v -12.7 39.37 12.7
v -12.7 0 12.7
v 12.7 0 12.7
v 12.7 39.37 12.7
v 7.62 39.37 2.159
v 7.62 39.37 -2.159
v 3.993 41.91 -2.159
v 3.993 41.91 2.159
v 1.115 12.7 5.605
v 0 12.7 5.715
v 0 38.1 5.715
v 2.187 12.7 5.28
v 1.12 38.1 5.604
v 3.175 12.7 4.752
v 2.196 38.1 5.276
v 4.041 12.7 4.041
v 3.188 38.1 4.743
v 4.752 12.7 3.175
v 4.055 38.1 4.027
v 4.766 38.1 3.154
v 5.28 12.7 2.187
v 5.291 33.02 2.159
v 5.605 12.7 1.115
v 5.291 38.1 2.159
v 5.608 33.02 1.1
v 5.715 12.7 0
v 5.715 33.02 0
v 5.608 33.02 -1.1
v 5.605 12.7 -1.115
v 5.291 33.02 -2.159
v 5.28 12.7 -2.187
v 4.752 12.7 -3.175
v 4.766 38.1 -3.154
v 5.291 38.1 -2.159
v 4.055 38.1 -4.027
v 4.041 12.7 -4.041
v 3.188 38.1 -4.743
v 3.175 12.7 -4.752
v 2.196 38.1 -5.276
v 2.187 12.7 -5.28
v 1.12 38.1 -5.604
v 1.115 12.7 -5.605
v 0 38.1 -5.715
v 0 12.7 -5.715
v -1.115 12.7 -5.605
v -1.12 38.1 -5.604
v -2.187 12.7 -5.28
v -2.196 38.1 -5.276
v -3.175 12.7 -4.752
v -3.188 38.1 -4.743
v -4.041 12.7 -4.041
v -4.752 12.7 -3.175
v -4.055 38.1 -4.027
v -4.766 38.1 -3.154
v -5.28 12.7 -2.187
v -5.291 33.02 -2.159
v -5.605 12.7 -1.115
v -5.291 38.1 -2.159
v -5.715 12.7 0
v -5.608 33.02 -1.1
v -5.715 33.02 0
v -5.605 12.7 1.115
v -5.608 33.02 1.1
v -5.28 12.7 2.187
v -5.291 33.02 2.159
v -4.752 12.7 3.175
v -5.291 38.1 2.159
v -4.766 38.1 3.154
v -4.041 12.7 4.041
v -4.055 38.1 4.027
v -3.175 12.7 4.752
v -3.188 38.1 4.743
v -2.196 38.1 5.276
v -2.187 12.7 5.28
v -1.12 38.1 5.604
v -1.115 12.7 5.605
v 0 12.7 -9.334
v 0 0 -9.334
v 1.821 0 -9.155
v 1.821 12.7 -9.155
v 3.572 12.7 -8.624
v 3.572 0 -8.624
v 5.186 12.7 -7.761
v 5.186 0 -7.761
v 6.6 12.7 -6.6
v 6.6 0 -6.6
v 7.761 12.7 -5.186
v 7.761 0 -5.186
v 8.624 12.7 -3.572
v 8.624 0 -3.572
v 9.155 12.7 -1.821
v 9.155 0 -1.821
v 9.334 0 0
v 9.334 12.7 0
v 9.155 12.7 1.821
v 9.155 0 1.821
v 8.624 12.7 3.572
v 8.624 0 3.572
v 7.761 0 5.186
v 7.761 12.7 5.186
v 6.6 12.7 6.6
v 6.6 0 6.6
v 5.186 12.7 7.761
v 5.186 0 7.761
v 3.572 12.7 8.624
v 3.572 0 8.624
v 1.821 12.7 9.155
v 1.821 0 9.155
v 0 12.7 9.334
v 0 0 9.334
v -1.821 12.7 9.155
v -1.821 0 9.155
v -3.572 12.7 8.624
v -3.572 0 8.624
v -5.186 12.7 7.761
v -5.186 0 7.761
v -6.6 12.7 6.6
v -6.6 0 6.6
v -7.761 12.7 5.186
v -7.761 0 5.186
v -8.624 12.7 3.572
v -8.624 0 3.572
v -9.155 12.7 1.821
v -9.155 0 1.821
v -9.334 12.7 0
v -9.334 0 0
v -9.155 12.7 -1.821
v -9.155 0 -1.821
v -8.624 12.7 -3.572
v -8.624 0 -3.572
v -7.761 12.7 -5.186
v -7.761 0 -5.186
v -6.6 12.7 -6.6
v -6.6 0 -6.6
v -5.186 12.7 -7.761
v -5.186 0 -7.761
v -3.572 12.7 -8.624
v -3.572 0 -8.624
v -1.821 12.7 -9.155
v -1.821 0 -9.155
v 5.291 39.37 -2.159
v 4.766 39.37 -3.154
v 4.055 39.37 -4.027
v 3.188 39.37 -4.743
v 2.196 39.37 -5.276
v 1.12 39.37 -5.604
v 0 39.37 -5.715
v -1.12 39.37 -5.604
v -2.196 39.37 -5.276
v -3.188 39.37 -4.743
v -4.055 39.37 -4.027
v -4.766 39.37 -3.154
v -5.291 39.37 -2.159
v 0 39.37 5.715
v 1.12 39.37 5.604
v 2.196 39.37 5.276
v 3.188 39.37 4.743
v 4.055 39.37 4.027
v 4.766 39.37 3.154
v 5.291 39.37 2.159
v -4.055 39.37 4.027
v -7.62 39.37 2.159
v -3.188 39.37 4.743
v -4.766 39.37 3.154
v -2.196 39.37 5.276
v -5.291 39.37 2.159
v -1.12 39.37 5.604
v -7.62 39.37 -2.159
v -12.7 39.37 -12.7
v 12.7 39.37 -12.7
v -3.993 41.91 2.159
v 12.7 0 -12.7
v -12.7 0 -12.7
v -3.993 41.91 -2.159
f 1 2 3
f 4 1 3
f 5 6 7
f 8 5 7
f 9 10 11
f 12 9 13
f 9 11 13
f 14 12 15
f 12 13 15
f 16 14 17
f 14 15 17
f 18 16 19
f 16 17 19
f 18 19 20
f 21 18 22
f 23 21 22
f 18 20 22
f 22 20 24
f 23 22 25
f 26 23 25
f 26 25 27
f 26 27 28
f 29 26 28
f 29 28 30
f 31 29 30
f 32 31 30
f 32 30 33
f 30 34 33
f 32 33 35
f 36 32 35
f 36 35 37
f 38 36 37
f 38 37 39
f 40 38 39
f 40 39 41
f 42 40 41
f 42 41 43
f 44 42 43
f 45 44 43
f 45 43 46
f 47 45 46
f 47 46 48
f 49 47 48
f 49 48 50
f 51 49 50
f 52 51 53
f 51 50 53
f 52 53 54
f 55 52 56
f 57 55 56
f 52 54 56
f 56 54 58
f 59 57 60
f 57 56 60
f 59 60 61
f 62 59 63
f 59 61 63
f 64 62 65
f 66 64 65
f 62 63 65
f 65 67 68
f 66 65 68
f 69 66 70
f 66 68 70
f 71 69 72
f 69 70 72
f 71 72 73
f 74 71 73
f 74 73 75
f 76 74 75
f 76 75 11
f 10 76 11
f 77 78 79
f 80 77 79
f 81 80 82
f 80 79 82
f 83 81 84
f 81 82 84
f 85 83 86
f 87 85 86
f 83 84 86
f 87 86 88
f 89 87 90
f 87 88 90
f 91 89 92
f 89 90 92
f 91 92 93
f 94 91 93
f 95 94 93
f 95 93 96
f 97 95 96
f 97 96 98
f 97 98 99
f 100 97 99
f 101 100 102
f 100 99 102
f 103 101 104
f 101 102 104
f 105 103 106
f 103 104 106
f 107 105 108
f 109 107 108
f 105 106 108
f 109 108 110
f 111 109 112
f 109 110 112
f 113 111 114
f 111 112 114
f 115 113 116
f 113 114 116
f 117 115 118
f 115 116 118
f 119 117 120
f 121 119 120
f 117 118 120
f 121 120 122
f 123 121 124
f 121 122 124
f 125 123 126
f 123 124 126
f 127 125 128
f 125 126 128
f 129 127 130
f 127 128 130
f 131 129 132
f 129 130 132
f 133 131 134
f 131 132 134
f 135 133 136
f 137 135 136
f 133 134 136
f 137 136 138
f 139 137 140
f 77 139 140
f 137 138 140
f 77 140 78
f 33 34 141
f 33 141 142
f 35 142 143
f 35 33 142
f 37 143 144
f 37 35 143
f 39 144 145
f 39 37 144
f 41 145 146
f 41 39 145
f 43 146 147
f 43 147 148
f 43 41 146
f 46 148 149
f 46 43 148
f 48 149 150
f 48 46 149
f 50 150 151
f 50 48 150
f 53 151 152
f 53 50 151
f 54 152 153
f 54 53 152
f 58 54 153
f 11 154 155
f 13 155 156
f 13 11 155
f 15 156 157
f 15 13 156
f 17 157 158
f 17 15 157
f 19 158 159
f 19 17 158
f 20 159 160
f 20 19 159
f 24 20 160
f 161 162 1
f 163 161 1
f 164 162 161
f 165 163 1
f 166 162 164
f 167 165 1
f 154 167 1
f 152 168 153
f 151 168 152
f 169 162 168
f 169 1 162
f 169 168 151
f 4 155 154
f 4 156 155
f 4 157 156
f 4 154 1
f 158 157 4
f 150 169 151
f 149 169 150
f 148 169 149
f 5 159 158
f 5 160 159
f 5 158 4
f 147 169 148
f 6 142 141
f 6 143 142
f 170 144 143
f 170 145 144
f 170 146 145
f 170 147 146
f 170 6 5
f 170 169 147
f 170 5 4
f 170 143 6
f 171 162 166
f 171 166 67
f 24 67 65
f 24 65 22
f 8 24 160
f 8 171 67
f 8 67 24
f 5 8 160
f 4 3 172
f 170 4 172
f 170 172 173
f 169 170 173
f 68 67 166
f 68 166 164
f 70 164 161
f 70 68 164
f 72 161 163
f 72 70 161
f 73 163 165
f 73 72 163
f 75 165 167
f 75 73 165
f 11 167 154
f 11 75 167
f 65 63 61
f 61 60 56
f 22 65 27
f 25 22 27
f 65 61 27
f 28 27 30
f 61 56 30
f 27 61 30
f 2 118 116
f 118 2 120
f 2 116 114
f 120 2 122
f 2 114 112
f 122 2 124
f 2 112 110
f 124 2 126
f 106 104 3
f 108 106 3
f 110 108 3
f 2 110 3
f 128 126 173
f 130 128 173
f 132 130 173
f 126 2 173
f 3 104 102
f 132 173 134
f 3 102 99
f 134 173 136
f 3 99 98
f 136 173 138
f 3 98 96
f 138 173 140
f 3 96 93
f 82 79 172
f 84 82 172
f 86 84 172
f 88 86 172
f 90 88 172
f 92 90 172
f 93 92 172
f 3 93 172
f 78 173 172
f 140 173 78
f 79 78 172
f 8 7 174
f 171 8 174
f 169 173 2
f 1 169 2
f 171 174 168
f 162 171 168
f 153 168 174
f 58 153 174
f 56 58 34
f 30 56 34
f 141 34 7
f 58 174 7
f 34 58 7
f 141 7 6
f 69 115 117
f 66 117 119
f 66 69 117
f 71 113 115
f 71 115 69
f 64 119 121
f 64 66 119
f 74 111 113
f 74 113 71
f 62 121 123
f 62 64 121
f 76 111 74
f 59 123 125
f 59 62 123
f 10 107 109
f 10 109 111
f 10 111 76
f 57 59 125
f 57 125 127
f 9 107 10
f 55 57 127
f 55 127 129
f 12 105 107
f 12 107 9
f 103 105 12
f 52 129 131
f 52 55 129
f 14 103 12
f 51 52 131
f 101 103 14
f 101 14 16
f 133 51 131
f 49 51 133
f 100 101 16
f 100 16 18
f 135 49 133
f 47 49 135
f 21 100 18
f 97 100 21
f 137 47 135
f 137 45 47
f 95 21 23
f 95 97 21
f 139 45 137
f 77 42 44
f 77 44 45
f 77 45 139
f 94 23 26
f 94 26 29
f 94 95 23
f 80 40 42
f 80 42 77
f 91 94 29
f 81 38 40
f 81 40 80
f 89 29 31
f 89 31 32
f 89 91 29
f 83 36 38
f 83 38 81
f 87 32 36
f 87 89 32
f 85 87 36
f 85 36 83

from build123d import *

# Parameters (mm, degrees)
SKETCH1_R           = 12.7
BOSS_EXTRUDE1_DEPTH = 38.1
SKETCH2_R           = 5.715
CUT_EXTRUDE1_DEPTH  = 43.121134838
SKETCH3_R           = 9.3345
CUT_EXTRUDE2_DEPTH  = 12.7
SKETCH4_R           = 12.7
SKETCH4_R_2         = 5.715
BOSS_EXTRUDE2_DEPTH = 1.27
SKETCH5_W           = 11.43
SKETCH5_H           = 4.318
BOSS_EXTRUDE3_DEPTH = 6.35
BOSS_EXTRUDE4_DEPTH = 4.318
BOSS_EXTRUDE5_START = -39.37
BOSS_EXTRUDE5_DEPTH = 39.37


with BuildPart() as part:
    # Sketch1 → Boss-Extrude1 (new body)
    with BuildSketch(Plane(origin=(0, 0, 0), x_dir=(1, 0, 0), z_dir=(0, 1, 0))):
        with Locations(Location((0, 0, 0), (0, 0, 90))):
            Circle(SKETCH1_R)
    extrude(amount=BOSS_EXTRUDE1_DEPTH)

    # Sketch2 → Cut-Extrude1 (cut, through all)
    with BuildSketch(Plane(origin=(0, 38.1, 0), x_dir=(1, 0, 0), z_dir=(0, 1, 0))):
        with Locations(Location((0, 0, 0), (0, 0, 270))):
            Circle(SKETCH2_R)
    extrude(amount=-CUT_EXTRUDE1_DEPTH, mode=Mode.SUBTRACT)

    # Sketch3 → Cut-Extrude2 (cut)
    with BuildSketch(Plane.XZ):
        with Locations(Location((0, 0, 0), (0, 0, 270))):
            Circle(SKETCH3_R)
    extrude(amount=-CUT_EXTRUDE2_DEPTH, mode=Mode.SUBTRACT)

    # Sketch4 → Boss-Extrude2 (add)
    with BuildSketch(Plane(origin=(0, 38.1, 0), x_dir=(1, 0, 0), z_dir=(0, 1, 0))):
        with Locations(Location((0, 0, 0), (0, 0, 90))):
            Circle(SKETCH4_R)
        with Locations(Location((0, 0, 0), (0, 0, 270))):
            Circle(SKETCH4_R_2, mode=Mode.SUBTRACT)
    extrude(amount=BOSS_EXTRUDE2_DEPTH)

    # Sketch5 → Boss-Extrude3 (add)
    with BuildSketch(Plane(origin=(0, 39.37, 0), x_dir=(1, 0, 0), z_dir=(0, 1, 0))):
        Rectangle(SKETCH5_W, SKETCH5_H)
    extrude(amount=-BOSS_EXTRUDE3_DEPTH)

    # Sketch6 → Boss-Extrude4 (add)
    with BuildSketch(Plane(origin=(0, 0, -2.159), x_dir=(-1, 0, 0), z_dir=(0, 0, -1))):
        Polygon((7.62, 39.37), (-7.62, 39.37), (-3.992504063, 41.91), (3.992504063, 41.91), align=None)
    extrude(amount=-BOSS_EXTRUDE4_DEPTH)

    # Sketch7 → Boss-Extrude5 (add)
    with BuildSketch(Plane(origin=(0, 39.37, 0), x_dir=(1, 0, 0), z_dir=(0, 1, 0)).offset(BOSS_EXTRUDE5_START)):
        with BuildLine():
            ThreePointArc((12.7, 0), (8.980256115, -8.980256127), (-1.7e-08, -12.7))
            Line((-1.7e-08, -12.7), (12.7, -12.7))
            Line((12.7, -12.7), (12.7, 0))
        make_face()
        with BuildLine():
            ThreePointArc((-1.7e-08, -12.7), (-8.980256127, -8.980256115), (-12.7, 0))
            Line((-12.7, 0), (-12.7, -12.7))
            Line((-12.7, -12.7), (-1.7e-08, -12.7))
        make_face()
        with BuildLine():
            Line((-12.7, 12.7), (-12.7, 0))
            ThreePointArc((-12.7, 0), (-8.980256122, 8.980256121), (-1e-09, 12.7))
            Line((-1e-09, 12.7), (-12.7, 12.7))
        make_face()
        with BuildLine():
            Line((12.7, 12.7), (-1e-09, 12.7))
            ThreePointArc((-1e-09, 12.7), (8.980256121, 8.980256122), (12.7, 0))
            Line((12.7, 0), (12.7, 12.7))
        make_face()
    extrude(amount=BOSS_EXTRUDE5_DEPTH)


solid = part.part
